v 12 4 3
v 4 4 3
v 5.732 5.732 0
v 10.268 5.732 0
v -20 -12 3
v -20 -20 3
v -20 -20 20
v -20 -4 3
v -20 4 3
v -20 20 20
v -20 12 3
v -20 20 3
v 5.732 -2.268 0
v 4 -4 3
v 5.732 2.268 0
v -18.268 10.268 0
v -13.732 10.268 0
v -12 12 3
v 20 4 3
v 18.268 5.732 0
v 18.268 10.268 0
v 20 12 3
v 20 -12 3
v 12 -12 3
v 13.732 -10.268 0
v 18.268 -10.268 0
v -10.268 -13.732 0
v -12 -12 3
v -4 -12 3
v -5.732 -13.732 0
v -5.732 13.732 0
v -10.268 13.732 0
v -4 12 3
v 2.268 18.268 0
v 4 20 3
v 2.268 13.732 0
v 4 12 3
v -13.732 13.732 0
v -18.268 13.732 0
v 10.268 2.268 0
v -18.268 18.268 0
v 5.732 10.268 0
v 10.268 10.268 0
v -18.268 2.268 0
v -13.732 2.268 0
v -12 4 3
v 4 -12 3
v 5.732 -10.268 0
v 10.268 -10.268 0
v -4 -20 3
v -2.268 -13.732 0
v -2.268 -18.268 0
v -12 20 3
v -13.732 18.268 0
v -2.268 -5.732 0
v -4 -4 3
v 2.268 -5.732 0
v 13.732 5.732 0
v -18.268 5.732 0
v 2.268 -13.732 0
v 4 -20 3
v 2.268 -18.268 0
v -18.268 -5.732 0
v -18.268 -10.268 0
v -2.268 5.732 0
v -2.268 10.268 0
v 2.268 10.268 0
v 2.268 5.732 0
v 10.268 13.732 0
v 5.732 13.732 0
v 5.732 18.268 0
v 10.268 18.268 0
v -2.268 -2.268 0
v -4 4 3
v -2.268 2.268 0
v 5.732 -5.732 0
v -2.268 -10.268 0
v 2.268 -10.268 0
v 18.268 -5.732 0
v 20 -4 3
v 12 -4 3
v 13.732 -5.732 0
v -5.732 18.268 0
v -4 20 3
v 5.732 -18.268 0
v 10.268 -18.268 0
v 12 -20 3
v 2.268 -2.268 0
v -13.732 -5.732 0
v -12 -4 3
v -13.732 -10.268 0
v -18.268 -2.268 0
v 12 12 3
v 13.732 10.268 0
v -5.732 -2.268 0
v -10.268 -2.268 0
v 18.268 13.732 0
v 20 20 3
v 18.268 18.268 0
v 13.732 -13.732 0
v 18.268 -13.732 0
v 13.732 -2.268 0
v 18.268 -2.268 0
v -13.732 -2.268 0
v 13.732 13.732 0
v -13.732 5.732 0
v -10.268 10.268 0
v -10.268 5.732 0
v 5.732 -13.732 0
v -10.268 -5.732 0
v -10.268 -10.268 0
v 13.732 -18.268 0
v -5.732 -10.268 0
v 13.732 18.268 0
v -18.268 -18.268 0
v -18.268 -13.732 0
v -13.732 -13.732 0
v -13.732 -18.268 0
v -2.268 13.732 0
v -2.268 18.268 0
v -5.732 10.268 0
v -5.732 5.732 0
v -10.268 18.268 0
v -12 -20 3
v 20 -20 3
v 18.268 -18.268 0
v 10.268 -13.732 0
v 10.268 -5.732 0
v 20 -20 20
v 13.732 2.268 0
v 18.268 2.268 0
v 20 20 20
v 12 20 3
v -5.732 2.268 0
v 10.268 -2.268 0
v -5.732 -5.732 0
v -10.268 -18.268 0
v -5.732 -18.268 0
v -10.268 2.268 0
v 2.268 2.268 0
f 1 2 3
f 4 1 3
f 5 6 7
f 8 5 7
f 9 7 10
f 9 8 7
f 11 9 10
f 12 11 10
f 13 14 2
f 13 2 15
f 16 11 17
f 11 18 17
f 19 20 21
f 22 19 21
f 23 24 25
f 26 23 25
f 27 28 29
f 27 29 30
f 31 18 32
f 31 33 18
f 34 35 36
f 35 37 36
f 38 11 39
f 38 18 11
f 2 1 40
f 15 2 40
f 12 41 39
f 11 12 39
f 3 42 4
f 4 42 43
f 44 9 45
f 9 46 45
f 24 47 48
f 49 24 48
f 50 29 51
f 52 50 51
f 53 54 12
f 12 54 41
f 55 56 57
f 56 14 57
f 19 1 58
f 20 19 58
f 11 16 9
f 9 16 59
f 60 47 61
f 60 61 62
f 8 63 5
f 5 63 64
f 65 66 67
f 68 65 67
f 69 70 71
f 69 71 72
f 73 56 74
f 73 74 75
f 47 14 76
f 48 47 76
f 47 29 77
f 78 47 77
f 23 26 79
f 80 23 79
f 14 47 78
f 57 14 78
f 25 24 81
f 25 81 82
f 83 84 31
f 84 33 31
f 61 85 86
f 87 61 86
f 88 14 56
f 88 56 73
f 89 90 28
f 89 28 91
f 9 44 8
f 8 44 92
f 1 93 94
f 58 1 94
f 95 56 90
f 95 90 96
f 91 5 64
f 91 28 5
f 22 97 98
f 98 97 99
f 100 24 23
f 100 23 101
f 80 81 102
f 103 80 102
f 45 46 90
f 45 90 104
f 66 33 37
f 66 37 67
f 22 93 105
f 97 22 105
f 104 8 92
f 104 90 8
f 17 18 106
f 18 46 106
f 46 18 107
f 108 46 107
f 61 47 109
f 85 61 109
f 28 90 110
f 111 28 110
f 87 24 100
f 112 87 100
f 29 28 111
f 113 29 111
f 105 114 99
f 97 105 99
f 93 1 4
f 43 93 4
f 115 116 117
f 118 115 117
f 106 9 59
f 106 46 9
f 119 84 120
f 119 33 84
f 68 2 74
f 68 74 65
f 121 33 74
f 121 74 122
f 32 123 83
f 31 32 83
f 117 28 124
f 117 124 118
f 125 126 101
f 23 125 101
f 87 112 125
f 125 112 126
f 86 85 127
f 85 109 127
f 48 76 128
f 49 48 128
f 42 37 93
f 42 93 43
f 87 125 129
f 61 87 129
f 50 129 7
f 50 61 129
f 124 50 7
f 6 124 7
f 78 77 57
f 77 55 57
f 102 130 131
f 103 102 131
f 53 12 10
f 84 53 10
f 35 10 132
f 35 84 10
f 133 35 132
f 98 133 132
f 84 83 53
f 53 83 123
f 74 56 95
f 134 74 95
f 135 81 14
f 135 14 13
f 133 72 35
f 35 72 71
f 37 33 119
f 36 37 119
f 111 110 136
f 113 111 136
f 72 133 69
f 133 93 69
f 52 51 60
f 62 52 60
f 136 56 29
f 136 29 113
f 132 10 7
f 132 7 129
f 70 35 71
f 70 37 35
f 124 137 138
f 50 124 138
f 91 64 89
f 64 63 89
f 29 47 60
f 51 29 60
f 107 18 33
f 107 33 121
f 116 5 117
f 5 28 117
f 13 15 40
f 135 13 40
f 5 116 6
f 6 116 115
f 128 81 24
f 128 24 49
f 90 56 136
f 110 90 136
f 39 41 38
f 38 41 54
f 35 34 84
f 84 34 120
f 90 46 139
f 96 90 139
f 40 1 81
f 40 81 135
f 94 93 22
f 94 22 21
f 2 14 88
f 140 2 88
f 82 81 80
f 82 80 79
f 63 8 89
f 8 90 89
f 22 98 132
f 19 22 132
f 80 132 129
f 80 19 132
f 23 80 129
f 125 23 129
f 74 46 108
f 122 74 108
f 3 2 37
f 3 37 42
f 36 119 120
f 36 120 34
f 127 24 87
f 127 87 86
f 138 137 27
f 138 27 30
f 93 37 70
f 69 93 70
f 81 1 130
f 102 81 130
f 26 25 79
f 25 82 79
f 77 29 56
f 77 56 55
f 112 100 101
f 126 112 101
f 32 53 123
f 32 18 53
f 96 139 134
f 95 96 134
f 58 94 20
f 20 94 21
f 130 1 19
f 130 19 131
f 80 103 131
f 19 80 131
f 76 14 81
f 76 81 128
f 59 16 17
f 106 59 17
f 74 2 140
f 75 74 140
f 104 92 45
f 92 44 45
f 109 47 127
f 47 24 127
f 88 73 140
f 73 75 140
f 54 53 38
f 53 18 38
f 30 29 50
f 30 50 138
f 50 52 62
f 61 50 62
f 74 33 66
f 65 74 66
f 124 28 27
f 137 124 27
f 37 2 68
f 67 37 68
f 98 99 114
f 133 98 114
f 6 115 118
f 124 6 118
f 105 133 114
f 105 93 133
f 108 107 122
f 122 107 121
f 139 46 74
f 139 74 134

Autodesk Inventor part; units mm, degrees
ref_plane "YZ Plane" through (0, 0, 0) normal (1, 0, 0) x (0, 1, 0)
ref_plane "XZ Plane" through (0, 0, 0) normal (0, 1, 0) x (-1, 0, 0)
ref_plane "XY Plane" through (0, 0, 0) normal (0, 0, 1) x (1, 0, 0)
sketch "Sketch1" plane through (0, 0, 0) normal (0, 0, 1) x (1, 0, 0)
  line L0 (-20, 20) -> (20, 20)
  line L1 (20, 20) -> (20, -20)
  line L2 (20, -20) -> (-20, -20)
  line L3 (-20, -20) -> (-20, 20)
  point P0 (0, 0)
  point P1 (-20, 0)
  point P2 (0, 20)
  dimension "d0" = 40
  dimension "d1" = 40
extrude "Extrusion1" add sketch "Sketch1" along normal blind 20
sketch "Sketch2" plane through (-20, -20, 0) normal (0, -1, 0) x (1, 0, 0)
  line L0 (0, 0) -> (40, 0) projected
  line L1 (0, 0) -> (0, 20) projected
  line L2 (40, 0) -> (0, 0)
  line L3 (0, 0) -> (0, 3)
  line L4 (0, 3) -> (40, 3)
  line L5 (40, 3) -> (40, 0)
  line L6 (40, 0) -> (0, 0) projected
  line L7 (32, 0) -> (32, 3)
  line L8 (32, 3) -> (33.7321, 0)
  line L9 (32, 3) -> (30.2679, 0)
  point P0 (20, 0)
  point P1 (40, 1.5)
  dimension "d4" = 3
  dimension "d5" = 8
  dimension "d6" = 30
  dimension "d7" = 30
extrude "Extrusion2" cut sketch "Sketch2" against normal through all contours L9 L7 L0 | L7 L8 L0
pattern_linear "Rectangular Pattern1" count 4 spacing 8 along (-1, 0, 0) of "Extrusion2"
ref_plane "Work Plane1" through (-20, 0, 20) normal (0, -1, 0) x (1, 0, 0)
ref_plane "Work Plane2" through (0, -20, 0) normal (1, 0, 0) x (0, 0, -1)
pattern_circular "Circular Pattern1" count 2 over 90 about axis through (0, 0, 20) along (0, 0, 1) of "Extrusion2", "Rectangular Pattern1"
chamfer "Chamfer1" distance 3 angle 30 5 edges at (16.866, 20, 0) (8, 20, 0) (0, 20, 0) (-8, 20, 0) (-16.866, 20, 0) measured on face at (-1.3333, 20, 14.3333)
chamfer "Chamfer2" distance 3 angle 30 5 edges at (-20, 16.0003, 0) (-20, 8, 0) (-20, 0, 0) (-20, -8, 0) (-20, -16.866, 0) measured on face at (-20, -1.3333, 14.3333)
chamfer "Chamfer3" distance 3 angle 30 5 edges at (-16.0003, -20, 0) (-8, -20, 0) (0, -20, 0) (8, -20, 0) (16.866, -20, 0) measured on face at (1.3333, -20, 14.3333)
chamfer "Chamfer4" distance 3 angle 30 5 edges at (20, -16.0003, 0) (20, -8, 0) (20, 8, 0) (20, 0, 0) (20, 16.0003, 0) measured on face at (20, 1.3333, 14.3333)
properties part number "LI0013-FOOT"
